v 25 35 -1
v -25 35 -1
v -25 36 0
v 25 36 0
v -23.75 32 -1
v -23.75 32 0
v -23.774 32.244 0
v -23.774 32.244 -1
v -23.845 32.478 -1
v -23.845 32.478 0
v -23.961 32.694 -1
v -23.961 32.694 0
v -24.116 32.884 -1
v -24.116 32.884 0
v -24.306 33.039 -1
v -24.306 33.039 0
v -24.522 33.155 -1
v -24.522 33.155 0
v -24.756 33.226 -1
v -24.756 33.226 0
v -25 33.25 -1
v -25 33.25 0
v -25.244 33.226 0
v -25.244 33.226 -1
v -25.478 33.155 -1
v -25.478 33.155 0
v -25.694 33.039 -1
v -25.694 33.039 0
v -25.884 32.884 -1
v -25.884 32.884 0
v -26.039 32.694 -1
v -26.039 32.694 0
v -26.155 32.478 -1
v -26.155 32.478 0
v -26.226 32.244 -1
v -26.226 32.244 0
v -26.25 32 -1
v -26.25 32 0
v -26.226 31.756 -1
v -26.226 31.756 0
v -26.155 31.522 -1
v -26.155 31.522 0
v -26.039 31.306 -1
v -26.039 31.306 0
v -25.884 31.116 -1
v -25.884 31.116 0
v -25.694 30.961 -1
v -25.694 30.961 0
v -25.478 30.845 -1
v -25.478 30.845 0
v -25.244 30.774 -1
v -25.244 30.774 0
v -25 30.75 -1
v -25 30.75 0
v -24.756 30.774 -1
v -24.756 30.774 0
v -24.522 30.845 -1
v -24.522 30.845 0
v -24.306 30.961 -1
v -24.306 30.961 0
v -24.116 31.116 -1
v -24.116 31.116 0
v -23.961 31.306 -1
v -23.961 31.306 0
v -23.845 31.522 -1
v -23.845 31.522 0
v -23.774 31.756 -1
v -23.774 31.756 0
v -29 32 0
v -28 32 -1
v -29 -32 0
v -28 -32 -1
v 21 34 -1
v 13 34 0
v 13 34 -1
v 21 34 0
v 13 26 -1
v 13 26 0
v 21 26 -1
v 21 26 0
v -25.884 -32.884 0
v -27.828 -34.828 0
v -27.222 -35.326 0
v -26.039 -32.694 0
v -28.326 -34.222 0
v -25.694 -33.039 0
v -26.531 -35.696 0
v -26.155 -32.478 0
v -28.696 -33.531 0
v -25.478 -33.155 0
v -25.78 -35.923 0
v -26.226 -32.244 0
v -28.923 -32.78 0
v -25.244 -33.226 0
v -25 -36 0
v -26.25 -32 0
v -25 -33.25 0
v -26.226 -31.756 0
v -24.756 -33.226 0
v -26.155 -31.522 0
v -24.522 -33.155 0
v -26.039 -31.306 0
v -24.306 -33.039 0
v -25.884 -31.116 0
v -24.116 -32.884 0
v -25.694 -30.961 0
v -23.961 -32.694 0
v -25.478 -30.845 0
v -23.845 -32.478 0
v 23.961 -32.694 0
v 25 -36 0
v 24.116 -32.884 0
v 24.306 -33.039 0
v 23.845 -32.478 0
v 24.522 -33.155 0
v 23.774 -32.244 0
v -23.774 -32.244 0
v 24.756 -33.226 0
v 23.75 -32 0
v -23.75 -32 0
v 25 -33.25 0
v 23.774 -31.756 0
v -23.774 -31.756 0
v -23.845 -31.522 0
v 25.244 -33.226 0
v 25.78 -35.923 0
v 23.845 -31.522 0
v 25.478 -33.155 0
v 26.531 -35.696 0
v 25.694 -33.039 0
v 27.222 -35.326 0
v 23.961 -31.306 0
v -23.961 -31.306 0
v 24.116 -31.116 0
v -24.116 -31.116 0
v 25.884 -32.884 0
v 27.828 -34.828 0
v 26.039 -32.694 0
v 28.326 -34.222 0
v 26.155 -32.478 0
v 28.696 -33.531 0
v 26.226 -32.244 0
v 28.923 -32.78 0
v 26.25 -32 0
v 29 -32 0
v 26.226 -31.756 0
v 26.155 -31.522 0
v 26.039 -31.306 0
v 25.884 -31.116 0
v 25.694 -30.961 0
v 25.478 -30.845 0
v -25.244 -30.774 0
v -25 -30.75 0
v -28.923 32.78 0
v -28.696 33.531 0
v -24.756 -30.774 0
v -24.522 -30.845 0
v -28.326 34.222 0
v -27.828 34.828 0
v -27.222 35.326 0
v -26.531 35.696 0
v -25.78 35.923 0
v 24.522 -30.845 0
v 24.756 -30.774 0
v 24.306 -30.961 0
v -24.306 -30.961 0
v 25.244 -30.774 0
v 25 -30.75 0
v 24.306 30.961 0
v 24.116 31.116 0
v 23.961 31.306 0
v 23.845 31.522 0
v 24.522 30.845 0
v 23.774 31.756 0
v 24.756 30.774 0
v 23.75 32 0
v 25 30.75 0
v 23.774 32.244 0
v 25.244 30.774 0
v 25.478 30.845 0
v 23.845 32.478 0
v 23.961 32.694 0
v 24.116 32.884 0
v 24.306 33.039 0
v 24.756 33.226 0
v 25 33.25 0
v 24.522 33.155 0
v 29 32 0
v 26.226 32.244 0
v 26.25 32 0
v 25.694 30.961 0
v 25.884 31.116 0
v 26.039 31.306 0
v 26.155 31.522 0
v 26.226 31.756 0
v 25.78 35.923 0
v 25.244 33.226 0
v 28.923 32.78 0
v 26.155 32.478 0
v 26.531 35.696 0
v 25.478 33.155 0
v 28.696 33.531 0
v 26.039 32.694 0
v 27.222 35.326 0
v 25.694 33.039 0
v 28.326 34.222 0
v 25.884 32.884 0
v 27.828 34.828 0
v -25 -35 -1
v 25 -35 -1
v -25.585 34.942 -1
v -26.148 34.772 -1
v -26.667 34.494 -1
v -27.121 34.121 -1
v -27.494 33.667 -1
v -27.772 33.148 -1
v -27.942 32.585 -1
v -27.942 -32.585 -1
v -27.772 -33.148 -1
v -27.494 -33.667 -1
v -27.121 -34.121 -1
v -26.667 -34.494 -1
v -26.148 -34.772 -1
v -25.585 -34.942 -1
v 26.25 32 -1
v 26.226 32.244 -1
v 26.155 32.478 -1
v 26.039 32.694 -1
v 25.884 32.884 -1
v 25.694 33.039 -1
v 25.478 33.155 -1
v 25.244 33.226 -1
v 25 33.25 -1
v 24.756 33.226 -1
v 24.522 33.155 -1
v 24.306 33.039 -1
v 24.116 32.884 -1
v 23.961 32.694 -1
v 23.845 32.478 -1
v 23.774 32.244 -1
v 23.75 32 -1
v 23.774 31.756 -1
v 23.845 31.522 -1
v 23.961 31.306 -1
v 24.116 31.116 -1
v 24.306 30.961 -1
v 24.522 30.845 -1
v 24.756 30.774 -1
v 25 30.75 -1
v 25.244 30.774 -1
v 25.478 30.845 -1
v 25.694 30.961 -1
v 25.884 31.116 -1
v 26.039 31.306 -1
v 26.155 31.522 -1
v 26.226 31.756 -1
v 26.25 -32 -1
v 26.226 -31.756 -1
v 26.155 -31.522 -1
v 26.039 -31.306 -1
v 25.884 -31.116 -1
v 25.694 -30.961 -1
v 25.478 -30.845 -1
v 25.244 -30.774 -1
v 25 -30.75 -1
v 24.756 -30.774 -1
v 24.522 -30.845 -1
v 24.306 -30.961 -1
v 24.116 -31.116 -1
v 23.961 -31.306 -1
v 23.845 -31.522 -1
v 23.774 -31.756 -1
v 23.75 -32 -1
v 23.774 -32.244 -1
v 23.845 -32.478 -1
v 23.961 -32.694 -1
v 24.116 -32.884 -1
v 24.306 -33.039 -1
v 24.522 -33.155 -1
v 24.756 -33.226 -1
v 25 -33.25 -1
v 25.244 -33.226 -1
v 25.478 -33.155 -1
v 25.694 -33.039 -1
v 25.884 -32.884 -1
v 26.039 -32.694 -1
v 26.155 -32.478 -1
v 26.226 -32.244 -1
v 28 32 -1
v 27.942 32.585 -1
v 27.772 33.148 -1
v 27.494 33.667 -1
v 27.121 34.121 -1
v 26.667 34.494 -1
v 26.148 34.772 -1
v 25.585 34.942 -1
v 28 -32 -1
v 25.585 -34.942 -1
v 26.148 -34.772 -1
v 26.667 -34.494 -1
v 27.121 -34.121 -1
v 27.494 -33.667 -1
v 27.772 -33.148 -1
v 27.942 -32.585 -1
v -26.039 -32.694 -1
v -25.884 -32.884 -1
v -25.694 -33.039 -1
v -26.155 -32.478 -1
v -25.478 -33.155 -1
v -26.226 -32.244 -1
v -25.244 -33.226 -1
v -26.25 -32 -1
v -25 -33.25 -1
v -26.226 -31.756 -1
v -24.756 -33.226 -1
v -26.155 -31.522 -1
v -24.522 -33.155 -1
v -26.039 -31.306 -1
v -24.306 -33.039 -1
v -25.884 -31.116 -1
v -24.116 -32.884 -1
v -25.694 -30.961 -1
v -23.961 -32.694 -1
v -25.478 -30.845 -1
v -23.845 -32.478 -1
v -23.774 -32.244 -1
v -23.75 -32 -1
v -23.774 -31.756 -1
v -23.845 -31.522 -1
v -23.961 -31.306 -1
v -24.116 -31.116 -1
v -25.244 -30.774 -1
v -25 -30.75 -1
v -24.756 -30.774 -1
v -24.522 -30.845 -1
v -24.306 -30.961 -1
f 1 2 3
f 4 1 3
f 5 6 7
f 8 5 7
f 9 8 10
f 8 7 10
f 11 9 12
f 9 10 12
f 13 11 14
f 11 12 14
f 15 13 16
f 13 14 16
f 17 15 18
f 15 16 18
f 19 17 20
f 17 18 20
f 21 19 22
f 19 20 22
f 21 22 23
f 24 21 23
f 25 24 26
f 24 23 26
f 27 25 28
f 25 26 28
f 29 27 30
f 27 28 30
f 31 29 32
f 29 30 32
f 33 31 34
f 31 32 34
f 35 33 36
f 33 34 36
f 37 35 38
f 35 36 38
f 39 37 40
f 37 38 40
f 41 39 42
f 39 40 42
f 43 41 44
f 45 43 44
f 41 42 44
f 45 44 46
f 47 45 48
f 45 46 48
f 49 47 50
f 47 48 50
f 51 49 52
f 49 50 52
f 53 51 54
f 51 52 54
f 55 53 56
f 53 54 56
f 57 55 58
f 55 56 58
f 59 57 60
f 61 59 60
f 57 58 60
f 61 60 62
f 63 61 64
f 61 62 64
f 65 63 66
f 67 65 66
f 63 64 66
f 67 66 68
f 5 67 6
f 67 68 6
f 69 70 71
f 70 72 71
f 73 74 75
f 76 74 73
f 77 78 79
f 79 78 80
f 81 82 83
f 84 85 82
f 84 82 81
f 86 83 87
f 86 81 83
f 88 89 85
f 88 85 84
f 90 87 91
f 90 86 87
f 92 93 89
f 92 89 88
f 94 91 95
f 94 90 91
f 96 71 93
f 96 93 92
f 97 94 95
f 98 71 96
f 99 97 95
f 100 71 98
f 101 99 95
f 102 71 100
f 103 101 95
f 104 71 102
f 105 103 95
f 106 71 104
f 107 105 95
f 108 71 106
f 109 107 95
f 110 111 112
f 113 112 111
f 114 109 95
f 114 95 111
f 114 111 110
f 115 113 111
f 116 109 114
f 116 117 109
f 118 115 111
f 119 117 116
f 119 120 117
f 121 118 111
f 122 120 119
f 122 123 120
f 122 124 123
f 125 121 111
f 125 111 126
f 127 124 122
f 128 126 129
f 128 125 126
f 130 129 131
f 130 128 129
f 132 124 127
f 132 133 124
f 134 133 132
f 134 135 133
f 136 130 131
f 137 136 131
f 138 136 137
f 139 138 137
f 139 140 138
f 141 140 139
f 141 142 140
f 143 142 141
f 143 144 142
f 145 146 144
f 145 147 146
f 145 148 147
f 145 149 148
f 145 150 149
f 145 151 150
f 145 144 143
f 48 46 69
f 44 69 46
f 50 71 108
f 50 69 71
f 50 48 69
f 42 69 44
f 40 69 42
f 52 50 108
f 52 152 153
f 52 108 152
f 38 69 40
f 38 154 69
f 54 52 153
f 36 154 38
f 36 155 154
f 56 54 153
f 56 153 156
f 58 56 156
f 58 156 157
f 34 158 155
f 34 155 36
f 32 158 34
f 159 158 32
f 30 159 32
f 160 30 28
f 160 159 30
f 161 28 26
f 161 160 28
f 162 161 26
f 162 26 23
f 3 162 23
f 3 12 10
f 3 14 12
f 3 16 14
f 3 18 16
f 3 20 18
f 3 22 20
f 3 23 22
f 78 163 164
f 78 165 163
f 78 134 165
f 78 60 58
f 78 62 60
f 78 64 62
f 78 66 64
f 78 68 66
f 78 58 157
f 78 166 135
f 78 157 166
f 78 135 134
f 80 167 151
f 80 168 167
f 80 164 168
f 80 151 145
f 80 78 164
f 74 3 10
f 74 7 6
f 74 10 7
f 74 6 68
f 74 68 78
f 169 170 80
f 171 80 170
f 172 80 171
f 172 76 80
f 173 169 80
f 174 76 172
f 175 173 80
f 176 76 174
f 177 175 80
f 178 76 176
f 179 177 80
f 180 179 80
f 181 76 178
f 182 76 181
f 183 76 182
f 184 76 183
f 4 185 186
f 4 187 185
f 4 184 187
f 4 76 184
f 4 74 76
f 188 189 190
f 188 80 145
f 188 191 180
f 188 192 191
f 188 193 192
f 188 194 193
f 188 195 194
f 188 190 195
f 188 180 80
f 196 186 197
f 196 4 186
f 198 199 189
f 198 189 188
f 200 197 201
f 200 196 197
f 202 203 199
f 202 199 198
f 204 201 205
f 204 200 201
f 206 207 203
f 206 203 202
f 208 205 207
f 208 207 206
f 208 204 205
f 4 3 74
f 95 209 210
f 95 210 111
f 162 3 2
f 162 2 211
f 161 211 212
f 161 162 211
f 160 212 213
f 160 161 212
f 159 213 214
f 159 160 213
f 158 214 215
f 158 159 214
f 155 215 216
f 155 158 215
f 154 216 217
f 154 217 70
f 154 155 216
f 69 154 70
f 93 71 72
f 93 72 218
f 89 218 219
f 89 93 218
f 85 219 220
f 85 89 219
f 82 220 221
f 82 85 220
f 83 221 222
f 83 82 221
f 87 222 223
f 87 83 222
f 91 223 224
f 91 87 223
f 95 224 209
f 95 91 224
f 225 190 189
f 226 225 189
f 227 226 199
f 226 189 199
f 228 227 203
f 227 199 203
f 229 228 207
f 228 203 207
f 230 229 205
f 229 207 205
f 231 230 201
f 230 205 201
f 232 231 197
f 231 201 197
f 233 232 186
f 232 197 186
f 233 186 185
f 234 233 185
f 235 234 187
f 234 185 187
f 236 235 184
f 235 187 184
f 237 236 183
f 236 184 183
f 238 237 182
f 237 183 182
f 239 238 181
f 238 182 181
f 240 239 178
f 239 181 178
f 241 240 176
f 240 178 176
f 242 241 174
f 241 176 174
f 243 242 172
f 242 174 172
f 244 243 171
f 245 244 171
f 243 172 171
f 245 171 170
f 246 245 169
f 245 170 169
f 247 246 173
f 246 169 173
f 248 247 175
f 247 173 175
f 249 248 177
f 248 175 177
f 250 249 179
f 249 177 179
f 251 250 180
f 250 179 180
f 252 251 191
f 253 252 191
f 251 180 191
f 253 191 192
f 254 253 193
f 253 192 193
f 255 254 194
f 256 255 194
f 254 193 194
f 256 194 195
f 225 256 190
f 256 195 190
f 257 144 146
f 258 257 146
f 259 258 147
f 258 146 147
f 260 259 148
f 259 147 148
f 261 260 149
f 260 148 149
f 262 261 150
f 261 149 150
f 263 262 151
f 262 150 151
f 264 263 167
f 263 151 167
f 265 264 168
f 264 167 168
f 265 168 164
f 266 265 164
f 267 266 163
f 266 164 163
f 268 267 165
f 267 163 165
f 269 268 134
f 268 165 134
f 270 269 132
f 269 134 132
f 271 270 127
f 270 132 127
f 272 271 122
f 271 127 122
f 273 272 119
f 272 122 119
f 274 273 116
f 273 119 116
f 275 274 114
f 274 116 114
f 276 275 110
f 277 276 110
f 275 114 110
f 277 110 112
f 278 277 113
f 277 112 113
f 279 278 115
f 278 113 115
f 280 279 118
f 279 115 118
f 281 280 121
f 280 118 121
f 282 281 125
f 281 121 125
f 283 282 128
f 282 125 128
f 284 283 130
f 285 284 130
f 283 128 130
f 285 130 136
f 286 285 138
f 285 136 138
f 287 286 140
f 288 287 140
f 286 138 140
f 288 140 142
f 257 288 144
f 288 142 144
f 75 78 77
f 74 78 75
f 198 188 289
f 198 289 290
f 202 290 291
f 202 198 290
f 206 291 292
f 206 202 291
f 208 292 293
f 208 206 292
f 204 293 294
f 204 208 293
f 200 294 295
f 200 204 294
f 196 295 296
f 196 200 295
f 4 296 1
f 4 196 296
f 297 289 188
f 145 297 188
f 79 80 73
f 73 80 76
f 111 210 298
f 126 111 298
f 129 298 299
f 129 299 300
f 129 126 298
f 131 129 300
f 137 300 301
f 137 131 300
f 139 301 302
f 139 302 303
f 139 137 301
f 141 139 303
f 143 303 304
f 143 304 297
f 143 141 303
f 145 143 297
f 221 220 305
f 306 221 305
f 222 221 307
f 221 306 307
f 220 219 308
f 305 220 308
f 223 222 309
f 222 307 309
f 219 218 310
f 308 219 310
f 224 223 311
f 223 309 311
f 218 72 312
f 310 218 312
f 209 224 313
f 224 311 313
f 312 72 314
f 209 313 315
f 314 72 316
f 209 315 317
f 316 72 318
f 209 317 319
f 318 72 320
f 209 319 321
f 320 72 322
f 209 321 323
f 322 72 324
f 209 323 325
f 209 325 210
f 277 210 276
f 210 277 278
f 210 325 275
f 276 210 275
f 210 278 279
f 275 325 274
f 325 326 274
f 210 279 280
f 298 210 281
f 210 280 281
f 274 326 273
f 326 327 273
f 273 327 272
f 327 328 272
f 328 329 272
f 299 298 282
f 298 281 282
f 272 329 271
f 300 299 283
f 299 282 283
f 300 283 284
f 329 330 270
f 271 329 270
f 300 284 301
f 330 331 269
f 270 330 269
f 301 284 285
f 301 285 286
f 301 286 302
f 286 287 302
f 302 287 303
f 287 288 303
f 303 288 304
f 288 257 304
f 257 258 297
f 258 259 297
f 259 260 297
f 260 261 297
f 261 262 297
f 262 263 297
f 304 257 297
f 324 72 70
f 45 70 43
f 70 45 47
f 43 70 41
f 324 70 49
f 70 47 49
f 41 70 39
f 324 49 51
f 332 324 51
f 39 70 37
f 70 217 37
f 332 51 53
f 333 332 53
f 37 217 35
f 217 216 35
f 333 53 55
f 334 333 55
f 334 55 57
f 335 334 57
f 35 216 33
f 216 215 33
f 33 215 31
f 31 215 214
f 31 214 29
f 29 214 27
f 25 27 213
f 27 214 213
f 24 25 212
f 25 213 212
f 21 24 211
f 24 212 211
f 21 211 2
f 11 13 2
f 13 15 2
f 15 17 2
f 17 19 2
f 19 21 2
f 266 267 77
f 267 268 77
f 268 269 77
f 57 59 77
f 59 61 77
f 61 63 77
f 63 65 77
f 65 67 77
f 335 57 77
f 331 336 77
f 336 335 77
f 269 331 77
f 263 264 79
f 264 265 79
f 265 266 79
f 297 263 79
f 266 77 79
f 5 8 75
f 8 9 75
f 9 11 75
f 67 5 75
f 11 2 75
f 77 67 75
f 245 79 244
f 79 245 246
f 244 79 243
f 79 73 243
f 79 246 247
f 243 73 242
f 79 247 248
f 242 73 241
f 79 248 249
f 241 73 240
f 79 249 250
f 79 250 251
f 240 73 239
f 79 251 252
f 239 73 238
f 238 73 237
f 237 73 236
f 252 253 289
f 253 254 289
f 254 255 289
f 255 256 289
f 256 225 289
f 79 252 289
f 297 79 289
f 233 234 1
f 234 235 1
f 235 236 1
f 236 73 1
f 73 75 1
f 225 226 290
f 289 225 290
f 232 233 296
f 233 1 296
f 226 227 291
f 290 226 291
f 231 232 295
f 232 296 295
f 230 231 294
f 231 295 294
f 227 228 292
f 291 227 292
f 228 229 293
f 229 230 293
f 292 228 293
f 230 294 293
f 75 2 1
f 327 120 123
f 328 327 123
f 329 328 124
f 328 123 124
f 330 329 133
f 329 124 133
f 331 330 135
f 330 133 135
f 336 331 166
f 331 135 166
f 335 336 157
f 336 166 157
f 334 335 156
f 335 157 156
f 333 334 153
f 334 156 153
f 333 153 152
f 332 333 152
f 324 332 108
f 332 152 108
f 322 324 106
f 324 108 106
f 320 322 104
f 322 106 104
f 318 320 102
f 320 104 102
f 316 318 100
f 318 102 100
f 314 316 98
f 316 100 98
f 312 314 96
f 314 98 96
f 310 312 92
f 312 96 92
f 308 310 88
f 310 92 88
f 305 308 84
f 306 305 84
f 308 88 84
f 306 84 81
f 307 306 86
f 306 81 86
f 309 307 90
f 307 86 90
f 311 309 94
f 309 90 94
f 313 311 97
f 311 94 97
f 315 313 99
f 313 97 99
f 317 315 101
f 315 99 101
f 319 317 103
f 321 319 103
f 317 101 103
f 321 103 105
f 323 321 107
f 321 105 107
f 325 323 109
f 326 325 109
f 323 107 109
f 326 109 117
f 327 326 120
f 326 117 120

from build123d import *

# Parameters (mm, degrees)
SKETCH039_W      = 60
SKETCH039_H      = 74
SKETCH039_R      = 1.25
SKETCH039_W_2    = 8
SKETCH039_H_2    = 8
EXTRUDE040_DEPTH = 1


with BuildPart() as bevel001:
    # Sweep002: sweep along a path in Sketch041
    with BuildLine(Plane(origin=(0, 0, -2), x_dir=(1, 0, 0), z_dir=(0, 0, -1))) as sweep002_path:
        Line((-25, 35), (25, 35))
        ThreePointArc((25, 35), (27.12132, 34.12132), (28, 32))
        Line((28, 32), (28, -32))
        ThreePointArc((28, -32), (27.12132, -34.12132), (25, -35))
        Line((25, -35), (-25, -35))
        ThreePointArc((-25, -35), (-27.12132, -34.12132), (-28, -32))
        Line((-28, -32), (-28, 32))
        ThreePointArc((-28, 32), (-27.12132, 34.12132), (-25, 35))
    # Sketch040 → Sweep002 (sweep)
    with BuildSketch(Plane.XZ):
        Polygon((-28, 11), (-30, 9), (-30, 1), (-28, -1), (-28, -2), (-33, -2), (-33, 12), (-28, 12), align=None)
    sweep(path=sweep002_path.line)


with BuildPart() as cut026:
    # Sketch039 → Extrude040 (new body)
    with BuildSketch(Plane.XY):
        Rectangle(SKETCH039_W, SKETCH039_H)
        with Locations((-25, 32)):
            Circle(SKETCH039_R, mode=Mode.SUBTRACT)
        with Locations((25, 32)):
            Circle(SKETCH039_R, mode=Mode.SUBTRACT)
        with Locations((-25, -32)):
            Circle(SKETCH039_R, mode=Mode.SUBTRACT)
        with Locations((25, -32)):
            Circle(SKETCH039_R, mode=Mode.SUBTRACT)
        with Locations((17, 30)):
            Rectangle(SKETCH039_W_2, SKETCH039_H_2, mode=Mode.SUBTRACT)
    extrude(amount=-EXTRUDE040_DEPTH)

    # Cut026: cut bevel001
    add(bevel001.part, mode=Mode.SUBTRACT)


solid = cut026.part
